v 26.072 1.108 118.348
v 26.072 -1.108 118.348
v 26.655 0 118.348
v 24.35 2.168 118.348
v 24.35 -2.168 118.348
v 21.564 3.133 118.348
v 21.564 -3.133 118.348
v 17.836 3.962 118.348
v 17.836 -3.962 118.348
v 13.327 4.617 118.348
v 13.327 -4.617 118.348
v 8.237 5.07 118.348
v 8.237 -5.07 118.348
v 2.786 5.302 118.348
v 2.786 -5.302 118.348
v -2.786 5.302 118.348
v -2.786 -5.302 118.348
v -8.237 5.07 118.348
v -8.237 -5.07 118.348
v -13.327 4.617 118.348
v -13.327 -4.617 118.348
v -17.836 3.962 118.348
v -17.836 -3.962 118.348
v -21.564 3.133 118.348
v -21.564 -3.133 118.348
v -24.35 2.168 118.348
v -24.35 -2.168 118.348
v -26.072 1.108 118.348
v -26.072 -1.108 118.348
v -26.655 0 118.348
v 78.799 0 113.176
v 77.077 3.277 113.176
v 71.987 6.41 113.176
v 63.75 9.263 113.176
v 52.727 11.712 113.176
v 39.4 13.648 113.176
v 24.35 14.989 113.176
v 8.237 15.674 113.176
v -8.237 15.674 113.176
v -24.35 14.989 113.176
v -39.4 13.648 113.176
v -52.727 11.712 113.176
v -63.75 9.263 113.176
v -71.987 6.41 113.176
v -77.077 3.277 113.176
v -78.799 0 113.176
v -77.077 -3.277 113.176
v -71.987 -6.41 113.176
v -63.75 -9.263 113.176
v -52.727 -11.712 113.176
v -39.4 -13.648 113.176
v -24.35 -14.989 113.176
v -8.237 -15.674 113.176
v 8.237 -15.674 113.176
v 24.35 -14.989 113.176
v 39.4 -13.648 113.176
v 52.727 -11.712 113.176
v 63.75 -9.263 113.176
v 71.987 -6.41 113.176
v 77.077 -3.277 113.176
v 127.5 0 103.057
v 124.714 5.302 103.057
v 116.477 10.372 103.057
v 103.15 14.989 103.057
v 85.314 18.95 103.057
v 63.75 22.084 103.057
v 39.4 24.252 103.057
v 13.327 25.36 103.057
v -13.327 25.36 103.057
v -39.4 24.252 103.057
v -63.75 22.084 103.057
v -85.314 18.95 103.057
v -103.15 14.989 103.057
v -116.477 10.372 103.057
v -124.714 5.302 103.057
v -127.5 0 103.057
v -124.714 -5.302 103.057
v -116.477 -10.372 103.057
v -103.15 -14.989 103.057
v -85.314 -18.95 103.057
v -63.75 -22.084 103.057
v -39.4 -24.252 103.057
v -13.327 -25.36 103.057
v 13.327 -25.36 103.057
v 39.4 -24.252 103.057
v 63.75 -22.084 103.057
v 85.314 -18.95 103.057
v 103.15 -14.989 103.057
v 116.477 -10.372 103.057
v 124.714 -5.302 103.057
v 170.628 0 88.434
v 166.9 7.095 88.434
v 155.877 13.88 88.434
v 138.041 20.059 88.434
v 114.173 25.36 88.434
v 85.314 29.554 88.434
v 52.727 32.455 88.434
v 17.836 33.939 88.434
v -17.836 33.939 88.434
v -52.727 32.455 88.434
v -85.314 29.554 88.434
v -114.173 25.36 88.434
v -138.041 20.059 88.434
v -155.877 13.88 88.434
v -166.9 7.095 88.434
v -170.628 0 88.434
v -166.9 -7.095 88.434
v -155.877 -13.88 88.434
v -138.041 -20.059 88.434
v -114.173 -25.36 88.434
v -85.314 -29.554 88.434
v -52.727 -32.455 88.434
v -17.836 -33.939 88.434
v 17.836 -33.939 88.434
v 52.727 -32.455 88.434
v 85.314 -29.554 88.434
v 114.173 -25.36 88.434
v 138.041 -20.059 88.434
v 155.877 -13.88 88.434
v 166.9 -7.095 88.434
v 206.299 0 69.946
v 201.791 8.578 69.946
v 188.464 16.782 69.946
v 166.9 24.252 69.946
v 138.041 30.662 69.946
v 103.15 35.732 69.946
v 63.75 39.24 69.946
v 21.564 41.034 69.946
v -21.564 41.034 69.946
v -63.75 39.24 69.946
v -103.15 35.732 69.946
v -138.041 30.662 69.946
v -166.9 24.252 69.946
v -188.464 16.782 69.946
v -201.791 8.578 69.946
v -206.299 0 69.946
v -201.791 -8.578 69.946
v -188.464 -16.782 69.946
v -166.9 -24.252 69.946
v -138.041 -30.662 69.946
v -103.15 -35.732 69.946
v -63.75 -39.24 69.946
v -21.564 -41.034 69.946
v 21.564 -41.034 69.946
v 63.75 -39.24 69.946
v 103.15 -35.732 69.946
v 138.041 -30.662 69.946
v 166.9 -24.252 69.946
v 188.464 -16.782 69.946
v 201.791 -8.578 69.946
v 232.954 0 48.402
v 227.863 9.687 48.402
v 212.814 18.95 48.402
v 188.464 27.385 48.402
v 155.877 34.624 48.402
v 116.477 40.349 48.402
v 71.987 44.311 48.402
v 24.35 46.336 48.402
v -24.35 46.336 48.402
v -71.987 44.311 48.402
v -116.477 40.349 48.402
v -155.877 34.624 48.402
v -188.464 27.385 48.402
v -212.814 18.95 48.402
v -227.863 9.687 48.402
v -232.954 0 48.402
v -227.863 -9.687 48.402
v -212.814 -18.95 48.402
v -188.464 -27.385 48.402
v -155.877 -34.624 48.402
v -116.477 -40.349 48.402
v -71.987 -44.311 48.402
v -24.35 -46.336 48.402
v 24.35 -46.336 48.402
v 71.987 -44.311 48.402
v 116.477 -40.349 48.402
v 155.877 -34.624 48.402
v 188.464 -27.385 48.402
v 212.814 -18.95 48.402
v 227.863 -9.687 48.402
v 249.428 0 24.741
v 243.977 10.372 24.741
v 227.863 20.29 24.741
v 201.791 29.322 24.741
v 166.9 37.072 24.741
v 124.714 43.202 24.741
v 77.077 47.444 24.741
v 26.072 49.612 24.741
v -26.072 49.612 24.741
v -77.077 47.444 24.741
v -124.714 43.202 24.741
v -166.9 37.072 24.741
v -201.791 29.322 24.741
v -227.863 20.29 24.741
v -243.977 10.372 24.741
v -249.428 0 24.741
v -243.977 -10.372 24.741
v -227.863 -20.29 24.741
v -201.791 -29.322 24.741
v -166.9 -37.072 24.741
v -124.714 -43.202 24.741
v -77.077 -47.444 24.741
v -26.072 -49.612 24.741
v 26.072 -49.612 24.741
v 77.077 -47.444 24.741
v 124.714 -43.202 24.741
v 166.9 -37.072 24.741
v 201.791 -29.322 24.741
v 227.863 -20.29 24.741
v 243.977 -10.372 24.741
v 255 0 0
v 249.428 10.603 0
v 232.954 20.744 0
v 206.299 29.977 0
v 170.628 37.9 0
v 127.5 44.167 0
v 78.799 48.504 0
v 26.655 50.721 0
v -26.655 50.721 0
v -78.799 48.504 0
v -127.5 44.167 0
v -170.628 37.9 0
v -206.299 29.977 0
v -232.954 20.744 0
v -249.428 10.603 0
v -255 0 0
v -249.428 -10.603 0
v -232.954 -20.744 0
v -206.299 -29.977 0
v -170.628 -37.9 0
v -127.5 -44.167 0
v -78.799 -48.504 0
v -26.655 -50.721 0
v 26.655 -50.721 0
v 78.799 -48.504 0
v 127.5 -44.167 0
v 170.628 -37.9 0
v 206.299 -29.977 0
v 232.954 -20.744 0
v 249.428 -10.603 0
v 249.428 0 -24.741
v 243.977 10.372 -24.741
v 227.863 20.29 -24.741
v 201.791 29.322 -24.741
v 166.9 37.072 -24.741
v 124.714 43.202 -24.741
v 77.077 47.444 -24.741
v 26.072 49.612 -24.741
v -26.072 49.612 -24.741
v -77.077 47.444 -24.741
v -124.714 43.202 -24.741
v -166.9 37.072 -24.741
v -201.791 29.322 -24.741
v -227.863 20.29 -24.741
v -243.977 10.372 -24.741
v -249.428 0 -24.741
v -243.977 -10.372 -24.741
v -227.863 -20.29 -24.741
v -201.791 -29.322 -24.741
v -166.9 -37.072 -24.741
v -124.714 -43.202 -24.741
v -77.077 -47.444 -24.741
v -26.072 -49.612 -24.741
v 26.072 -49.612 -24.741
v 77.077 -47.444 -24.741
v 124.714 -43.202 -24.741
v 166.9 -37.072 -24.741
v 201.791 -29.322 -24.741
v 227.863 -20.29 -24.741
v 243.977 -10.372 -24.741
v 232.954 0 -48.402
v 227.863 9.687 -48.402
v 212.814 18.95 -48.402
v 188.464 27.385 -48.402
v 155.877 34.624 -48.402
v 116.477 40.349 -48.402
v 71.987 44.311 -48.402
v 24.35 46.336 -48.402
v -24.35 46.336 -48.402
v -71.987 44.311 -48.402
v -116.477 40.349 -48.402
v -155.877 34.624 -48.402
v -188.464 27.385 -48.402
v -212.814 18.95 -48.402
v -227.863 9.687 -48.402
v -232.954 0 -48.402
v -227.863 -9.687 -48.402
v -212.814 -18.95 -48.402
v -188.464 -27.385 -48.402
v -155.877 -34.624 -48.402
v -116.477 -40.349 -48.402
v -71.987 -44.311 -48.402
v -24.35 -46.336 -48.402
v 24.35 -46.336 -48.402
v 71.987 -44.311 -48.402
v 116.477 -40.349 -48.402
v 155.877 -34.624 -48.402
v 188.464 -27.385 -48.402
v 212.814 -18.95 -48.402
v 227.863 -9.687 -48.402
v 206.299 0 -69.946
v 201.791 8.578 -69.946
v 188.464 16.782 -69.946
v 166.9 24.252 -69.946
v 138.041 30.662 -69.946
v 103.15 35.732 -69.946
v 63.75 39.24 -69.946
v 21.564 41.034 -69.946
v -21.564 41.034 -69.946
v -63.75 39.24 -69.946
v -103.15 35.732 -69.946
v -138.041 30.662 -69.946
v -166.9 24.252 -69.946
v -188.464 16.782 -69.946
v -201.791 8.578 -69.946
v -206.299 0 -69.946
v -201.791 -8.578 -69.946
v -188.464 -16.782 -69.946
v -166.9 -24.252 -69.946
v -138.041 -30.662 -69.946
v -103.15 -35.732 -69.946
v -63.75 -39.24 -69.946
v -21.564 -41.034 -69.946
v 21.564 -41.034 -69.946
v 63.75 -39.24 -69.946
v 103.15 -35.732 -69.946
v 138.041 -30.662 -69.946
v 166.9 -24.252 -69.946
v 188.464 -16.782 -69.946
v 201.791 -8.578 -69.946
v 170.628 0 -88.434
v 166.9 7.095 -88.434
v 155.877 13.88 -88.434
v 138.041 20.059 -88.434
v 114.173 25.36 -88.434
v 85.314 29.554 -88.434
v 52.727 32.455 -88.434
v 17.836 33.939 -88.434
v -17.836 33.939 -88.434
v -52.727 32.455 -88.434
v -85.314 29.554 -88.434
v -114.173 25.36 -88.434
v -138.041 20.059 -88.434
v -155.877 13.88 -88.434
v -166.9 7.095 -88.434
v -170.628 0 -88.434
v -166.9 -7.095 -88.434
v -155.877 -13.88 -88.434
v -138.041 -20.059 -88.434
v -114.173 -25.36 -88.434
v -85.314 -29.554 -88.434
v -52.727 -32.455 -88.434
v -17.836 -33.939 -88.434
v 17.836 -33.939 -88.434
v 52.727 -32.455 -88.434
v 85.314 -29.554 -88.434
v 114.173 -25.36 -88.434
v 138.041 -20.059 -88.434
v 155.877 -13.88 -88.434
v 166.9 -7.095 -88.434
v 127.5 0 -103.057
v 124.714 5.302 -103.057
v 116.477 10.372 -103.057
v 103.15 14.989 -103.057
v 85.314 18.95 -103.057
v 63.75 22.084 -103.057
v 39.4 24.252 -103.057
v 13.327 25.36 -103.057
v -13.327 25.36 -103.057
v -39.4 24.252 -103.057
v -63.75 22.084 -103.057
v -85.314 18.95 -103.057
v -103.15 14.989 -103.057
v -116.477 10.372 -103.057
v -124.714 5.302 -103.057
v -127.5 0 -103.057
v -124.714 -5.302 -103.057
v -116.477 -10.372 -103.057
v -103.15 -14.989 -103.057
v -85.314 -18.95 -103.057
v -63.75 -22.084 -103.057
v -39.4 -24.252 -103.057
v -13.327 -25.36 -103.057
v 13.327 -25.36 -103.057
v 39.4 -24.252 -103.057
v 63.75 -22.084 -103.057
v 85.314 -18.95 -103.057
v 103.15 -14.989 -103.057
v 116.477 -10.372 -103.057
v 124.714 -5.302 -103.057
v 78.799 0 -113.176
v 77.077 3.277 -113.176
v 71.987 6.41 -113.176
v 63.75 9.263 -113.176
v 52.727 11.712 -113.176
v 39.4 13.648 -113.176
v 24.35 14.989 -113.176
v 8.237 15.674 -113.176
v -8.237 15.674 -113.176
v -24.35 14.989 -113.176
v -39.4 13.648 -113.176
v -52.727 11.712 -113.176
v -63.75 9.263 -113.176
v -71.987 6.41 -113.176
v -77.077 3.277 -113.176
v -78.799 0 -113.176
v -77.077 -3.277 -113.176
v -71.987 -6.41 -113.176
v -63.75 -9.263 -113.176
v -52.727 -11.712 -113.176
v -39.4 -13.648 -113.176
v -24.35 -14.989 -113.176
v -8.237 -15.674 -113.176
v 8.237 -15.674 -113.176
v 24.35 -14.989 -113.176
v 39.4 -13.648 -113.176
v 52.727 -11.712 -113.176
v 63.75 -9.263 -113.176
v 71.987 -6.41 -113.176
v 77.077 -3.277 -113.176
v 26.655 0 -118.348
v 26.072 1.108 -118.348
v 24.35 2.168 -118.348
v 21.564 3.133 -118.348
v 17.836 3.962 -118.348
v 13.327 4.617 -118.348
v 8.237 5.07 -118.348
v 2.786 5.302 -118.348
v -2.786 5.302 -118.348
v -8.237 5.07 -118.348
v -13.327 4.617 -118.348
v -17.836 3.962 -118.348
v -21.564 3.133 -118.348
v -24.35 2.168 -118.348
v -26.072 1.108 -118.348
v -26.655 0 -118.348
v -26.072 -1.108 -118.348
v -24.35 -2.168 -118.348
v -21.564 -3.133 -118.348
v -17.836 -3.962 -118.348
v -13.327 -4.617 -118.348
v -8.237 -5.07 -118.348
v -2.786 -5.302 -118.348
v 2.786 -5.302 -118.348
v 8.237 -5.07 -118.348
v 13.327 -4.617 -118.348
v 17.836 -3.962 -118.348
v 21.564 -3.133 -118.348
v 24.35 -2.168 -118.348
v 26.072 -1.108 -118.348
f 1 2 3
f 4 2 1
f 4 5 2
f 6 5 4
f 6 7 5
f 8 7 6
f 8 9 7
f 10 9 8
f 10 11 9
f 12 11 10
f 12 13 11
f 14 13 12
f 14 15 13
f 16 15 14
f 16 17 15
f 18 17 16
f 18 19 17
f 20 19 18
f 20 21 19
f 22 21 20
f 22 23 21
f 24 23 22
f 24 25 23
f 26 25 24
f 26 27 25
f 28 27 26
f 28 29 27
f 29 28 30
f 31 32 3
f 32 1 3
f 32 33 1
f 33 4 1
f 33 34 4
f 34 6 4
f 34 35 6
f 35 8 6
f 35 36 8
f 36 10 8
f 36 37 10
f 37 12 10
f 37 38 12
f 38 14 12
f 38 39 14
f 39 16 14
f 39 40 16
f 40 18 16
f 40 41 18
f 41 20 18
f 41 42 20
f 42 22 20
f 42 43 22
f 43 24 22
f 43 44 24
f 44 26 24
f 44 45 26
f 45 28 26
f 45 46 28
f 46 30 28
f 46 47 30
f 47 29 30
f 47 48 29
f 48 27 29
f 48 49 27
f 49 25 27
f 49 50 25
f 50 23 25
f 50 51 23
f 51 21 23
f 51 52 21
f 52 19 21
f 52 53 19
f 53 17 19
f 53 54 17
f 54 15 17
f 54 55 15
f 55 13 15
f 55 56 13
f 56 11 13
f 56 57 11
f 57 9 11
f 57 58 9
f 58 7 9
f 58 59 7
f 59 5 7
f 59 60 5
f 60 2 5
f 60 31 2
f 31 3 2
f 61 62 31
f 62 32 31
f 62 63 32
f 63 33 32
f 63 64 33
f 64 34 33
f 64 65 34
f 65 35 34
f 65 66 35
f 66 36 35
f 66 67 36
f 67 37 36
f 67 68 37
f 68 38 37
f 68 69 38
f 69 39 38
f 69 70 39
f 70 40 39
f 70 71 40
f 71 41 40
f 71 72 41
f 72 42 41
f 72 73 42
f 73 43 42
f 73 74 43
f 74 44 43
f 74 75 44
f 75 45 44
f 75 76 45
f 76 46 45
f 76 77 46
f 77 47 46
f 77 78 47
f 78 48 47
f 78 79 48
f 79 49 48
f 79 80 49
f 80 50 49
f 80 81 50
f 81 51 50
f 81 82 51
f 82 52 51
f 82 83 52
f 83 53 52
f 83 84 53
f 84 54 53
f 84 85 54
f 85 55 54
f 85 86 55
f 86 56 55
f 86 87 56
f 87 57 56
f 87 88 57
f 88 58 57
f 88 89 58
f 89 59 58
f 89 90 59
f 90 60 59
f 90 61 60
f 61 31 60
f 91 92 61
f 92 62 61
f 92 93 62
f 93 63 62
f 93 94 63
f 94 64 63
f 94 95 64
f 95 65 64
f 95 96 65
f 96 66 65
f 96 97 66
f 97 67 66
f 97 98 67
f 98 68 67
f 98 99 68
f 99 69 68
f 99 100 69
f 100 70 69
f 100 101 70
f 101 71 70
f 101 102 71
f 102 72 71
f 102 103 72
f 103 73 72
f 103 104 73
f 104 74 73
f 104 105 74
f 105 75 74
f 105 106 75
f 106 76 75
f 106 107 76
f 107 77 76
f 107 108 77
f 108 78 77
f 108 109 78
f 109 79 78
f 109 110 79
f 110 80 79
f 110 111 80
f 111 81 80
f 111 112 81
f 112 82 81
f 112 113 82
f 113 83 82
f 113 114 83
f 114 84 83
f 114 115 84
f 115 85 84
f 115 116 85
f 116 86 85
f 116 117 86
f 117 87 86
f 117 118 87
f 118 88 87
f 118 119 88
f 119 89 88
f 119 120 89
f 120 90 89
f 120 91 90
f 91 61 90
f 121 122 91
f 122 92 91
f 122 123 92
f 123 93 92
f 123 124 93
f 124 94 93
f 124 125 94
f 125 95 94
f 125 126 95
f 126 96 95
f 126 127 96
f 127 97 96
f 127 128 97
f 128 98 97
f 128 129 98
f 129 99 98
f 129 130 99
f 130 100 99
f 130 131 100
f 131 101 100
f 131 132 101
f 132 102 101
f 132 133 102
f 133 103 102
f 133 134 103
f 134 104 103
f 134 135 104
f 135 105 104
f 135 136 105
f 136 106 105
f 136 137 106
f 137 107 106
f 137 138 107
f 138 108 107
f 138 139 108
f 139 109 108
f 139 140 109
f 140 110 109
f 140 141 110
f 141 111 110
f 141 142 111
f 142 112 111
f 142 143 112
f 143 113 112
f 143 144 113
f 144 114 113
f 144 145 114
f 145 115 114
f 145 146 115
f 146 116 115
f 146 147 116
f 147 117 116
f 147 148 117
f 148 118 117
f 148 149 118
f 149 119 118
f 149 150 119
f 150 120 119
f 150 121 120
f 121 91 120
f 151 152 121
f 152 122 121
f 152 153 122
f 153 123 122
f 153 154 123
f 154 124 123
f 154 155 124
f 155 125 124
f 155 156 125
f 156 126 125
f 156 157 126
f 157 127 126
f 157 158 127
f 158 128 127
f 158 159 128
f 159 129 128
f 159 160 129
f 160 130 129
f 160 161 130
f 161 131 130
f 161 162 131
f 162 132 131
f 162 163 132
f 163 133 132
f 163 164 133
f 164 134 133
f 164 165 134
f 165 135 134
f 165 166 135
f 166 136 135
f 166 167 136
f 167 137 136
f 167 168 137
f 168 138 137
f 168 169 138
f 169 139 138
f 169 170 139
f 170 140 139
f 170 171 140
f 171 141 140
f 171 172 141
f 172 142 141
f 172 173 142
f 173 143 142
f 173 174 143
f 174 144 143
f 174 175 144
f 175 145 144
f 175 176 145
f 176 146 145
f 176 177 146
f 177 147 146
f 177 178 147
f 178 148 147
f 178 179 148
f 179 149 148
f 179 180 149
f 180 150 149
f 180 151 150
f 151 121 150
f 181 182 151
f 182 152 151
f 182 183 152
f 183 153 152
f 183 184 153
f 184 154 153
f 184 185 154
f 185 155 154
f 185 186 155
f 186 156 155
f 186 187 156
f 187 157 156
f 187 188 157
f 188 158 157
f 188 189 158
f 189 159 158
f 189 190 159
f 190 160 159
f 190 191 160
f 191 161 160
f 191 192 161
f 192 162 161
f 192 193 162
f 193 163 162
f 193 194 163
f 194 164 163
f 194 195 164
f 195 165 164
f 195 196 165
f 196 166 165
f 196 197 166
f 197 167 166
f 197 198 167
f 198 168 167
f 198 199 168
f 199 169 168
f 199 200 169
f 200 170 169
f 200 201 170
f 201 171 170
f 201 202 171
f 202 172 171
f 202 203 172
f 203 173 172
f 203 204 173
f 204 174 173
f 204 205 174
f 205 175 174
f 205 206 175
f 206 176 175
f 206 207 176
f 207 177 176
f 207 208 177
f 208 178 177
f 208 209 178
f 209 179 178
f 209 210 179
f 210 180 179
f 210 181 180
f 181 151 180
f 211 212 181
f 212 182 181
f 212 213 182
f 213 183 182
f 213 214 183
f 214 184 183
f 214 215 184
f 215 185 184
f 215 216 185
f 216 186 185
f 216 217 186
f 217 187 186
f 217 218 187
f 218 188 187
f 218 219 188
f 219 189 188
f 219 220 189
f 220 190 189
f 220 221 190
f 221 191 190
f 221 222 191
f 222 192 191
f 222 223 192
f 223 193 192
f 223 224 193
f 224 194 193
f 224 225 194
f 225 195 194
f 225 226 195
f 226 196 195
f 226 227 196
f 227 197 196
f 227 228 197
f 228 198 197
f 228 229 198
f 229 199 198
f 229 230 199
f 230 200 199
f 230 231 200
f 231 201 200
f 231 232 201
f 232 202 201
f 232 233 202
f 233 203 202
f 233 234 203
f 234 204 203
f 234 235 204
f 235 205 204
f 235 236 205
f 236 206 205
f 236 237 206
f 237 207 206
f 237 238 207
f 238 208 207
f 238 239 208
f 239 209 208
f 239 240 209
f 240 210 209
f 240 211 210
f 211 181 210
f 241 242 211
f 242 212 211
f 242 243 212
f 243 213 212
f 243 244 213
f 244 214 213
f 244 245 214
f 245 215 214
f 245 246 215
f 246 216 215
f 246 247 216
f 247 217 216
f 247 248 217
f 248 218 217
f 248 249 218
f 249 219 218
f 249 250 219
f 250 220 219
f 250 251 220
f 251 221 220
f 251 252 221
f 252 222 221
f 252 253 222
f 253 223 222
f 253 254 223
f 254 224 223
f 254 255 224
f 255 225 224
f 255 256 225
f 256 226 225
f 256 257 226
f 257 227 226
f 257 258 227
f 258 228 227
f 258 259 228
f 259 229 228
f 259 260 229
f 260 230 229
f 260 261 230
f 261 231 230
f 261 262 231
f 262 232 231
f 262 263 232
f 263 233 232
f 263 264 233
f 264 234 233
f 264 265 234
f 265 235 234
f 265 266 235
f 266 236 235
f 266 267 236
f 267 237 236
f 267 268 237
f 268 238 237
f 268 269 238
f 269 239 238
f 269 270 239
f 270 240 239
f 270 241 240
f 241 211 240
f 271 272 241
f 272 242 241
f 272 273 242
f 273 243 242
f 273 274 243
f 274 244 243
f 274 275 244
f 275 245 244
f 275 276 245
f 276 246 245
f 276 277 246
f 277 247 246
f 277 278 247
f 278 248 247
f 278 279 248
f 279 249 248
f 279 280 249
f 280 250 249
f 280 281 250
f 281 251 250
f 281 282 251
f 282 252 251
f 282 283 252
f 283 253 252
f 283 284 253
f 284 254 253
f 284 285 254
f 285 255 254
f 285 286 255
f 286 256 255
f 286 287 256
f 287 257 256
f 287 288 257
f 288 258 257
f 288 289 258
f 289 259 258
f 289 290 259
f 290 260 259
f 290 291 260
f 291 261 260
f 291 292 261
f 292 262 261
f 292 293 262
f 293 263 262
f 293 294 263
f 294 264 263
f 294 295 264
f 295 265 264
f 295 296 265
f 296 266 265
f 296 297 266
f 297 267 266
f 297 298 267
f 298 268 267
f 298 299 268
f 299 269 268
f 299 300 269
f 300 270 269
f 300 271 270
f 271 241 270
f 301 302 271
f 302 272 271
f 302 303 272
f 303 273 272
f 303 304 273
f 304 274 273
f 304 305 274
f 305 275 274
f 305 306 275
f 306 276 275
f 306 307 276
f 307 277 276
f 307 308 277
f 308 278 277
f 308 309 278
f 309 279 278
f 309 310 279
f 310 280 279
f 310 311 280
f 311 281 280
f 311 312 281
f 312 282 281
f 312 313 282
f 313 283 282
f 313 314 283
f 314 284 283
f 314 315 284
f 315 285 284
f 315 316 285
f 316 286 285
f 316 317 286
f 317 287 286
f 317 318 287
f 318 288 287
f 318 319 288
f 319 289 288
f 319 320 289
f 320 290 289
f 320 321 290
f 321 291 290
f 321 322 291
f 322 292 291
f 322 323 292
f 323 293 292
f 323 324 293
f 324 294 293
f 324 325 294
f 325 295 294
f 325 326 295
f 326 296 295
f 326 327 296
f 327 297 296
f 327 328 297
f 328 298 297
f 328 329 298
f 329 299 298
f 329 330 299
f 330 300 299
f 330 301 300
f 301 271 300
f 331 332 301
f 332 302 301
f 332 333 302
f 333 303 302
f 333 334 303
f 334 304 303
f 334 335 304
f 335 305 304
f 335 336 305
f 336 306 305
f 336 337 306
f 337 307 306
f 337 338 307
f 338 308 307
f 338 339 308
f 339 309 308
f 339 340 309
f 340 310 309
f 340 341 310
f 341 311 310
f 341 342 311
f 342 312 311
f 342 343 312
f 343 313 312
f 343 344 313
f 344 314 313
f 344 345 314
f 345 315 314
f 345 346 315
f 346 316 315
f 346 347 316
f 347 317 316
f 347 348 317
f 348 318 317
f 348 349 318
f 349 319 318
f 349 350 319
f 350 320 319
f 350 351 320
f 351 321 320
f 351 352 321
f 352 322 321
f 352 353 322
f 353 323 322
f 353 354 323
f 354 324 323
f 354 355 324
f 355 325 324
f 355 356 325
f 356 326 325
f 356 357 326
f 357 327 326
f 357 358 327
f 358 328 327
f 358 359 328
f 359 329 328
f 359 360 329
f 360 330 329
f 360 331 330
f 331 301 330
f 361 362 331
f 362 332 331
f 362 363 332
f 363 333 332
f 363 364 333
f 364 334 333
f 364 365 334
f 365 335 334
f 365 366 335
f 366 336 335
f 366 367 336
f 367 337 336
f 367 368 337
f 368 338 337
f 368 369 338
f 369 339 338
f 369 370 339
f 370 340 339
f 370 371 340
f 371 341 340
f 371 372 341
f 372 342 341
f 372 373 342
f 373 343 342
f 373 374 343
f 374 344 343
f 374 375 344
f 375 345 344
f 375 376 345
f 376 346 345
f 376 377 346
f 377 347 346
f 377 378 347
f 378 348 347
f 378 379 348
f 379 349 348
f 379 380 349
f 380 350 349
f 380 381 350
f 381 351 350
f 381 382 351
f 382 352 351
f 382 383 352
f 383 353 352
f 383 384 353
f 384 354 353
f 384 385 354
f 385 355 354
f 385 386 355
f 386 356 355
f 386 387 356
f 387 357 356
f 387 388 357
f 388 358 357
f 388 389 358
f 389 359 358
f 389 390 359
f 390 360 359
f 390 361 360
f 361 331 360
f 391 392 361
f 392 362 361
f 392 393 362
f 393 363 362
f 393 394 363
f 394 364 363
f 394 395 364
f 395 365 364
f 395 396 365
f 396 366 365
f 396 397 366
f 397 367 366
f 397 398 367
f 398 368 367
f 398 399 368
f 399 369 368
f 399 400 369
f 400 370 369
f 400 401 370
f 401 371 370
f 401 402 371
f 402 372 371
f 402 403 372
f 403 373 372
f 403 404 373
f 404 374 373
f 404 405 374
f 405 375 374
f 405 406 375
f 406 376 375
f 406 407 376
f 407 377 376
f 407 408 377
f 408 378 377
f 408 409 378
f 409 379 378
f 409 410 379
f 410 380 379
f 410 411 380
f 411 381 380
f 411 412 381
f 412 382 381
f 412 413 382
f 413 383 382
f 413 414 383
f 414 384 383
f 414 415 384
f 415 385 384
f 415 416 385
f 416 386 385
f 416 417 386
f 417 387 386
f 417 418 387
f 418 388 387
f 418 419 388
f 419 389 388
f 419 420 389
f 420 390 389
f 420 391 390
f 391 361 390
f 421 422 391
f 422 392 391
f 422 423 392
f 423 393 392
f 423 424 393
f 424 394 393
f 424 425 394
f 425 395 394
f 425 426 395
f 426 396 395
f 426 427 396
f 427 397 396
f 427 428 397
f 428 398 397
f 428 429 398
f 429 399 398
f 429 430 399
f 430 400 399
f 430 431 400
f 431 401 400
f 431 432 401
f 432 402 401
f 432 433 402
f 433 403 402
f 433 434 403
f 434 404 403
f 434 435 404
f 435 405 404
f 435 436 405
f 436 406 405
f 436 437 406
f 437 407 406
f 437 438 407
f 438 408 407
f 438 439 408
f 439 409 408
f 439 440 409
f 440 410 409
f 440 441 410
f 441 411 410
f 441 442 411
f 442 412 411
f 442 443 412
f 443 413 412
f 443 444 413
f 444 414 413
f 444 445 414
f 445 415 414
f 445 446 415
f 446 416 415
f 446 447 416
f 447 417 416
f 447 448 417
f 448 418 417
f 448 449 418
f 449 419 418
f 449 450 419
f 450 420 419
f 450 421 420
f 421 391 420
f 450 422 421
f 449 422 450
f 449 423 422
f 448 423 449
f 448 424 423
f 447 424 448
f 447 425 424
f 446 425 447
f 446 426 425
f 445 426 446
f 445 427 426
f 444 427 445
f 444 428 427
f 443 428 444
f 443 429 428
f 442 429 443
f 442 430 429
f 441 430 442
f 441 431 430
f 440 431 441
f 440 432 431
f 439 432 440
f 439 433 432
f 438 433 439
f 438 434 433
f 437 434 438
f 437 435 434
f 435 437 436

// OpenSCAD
// Generated by SolidPython 1.0.1 on 2020-07-29 00:46:51


scale(v = [15, 3, 7]) {
	sphere(r = 17);
}
/***********************************************
*********      SolidPython code:      **********
************************************************
 
# import packages: SolidPython
from solid import *
from solid.utils import *
from itertools import chain, combinations, permutations


class Resize:

    def __init__(self, scad_file):
        self.scad_file = scad_file
        #self.scad_file = import_scad(scad_file)
        # cone/cylinder param:
        self.r1 = 0
        self.r2 = 0
        self.h = 0
        # rectangular prism param:
        self.w = 0
        self.l = 0
        # ellipse param:
        self.r = 0

    # import OpenScad code (file name corresponds to shape)


    # classify shape + parameters
    def assign(self, param1, param2, param3):
        if self.scad_file == 'cone.scad':
            self.r1 = param1
            self.r2 = param2
            self.h = param3
        elif self.scad_file == 'cylinder.scad':
            self.r1 = param1
            self.r2 = param2
            self.h = param3
        elif self.scad_file == 'rectangularPrism.scad':
            self.h = param1
            self.l = param2
            self.w = param3
        else:
            self.r = param1
            self.h = param2

    # resize parameters
    def iterate(self):
        x = range(3, 20, 2)
        i = 1
        if self.scad_file == 'cone.scad':
            tempList = list(permutations(x, 2))
            for temp in tempList:
                param1 = temp[0]
                param2 = temp[1]
                filepath = 'produced_scad_files/' + 'cone' + str(param1) + '_' + str(param2) + '_' + '.scad'
                scad_render_to_file(cylinder(h=param1, r1=param2, r2=0), filepath)

        elif self.scad_file == 'cylinder.scad':
            tempList = list(permutations(x, 3))
            for temp in tempList:
                param1 = temp[0]
                param2 = temp[1]
                filepath = 'produced_scad_files/' + 'cylinder' + str(param1) + '_' + str(param2) + '_' + '.scad'
                scad_render_to_file(cylinder(h=param1, r1=param2, r2=param2), filepath)

        elif self.scad_file == 'rectangularPrism.scad':
            tempList = list(permutations(x, 3))
            for temp in tempList:
                param1 = temp[0]
                param2 = temp[1]
                param3 = temp[2]
                filepath = 'produced_scad_files/' + 'rectangularPrism' + str(param1) + '_' + str(param2) + '_' + str(
                    param3) + '.scad'
                scad_render_to_file(cube(size=(param1, param2, param3)), filepath)

        elif self.scad_file == 'ellipse.scad':
            tempList = list(permutations(x, 4))
            for temp in tempList:
                param1 = temp[0]
                param2 = temp[1]
                param3 = temp[2]
                param4 = temp[3]
                filepath = 'produced_scad_files/' + 'ellipse' + str(param1) + '_' + str(param2) + '_' + str(param3) + '_' + str(param4) + '.scad'
                scad_render_to_file(scale([param1, param2, param3])(sphere(r=param4)), filepath)

    def render_to_scadfile(self):
        scad_render_to_file(scad, 'example.scad') 
 
************************************************/
